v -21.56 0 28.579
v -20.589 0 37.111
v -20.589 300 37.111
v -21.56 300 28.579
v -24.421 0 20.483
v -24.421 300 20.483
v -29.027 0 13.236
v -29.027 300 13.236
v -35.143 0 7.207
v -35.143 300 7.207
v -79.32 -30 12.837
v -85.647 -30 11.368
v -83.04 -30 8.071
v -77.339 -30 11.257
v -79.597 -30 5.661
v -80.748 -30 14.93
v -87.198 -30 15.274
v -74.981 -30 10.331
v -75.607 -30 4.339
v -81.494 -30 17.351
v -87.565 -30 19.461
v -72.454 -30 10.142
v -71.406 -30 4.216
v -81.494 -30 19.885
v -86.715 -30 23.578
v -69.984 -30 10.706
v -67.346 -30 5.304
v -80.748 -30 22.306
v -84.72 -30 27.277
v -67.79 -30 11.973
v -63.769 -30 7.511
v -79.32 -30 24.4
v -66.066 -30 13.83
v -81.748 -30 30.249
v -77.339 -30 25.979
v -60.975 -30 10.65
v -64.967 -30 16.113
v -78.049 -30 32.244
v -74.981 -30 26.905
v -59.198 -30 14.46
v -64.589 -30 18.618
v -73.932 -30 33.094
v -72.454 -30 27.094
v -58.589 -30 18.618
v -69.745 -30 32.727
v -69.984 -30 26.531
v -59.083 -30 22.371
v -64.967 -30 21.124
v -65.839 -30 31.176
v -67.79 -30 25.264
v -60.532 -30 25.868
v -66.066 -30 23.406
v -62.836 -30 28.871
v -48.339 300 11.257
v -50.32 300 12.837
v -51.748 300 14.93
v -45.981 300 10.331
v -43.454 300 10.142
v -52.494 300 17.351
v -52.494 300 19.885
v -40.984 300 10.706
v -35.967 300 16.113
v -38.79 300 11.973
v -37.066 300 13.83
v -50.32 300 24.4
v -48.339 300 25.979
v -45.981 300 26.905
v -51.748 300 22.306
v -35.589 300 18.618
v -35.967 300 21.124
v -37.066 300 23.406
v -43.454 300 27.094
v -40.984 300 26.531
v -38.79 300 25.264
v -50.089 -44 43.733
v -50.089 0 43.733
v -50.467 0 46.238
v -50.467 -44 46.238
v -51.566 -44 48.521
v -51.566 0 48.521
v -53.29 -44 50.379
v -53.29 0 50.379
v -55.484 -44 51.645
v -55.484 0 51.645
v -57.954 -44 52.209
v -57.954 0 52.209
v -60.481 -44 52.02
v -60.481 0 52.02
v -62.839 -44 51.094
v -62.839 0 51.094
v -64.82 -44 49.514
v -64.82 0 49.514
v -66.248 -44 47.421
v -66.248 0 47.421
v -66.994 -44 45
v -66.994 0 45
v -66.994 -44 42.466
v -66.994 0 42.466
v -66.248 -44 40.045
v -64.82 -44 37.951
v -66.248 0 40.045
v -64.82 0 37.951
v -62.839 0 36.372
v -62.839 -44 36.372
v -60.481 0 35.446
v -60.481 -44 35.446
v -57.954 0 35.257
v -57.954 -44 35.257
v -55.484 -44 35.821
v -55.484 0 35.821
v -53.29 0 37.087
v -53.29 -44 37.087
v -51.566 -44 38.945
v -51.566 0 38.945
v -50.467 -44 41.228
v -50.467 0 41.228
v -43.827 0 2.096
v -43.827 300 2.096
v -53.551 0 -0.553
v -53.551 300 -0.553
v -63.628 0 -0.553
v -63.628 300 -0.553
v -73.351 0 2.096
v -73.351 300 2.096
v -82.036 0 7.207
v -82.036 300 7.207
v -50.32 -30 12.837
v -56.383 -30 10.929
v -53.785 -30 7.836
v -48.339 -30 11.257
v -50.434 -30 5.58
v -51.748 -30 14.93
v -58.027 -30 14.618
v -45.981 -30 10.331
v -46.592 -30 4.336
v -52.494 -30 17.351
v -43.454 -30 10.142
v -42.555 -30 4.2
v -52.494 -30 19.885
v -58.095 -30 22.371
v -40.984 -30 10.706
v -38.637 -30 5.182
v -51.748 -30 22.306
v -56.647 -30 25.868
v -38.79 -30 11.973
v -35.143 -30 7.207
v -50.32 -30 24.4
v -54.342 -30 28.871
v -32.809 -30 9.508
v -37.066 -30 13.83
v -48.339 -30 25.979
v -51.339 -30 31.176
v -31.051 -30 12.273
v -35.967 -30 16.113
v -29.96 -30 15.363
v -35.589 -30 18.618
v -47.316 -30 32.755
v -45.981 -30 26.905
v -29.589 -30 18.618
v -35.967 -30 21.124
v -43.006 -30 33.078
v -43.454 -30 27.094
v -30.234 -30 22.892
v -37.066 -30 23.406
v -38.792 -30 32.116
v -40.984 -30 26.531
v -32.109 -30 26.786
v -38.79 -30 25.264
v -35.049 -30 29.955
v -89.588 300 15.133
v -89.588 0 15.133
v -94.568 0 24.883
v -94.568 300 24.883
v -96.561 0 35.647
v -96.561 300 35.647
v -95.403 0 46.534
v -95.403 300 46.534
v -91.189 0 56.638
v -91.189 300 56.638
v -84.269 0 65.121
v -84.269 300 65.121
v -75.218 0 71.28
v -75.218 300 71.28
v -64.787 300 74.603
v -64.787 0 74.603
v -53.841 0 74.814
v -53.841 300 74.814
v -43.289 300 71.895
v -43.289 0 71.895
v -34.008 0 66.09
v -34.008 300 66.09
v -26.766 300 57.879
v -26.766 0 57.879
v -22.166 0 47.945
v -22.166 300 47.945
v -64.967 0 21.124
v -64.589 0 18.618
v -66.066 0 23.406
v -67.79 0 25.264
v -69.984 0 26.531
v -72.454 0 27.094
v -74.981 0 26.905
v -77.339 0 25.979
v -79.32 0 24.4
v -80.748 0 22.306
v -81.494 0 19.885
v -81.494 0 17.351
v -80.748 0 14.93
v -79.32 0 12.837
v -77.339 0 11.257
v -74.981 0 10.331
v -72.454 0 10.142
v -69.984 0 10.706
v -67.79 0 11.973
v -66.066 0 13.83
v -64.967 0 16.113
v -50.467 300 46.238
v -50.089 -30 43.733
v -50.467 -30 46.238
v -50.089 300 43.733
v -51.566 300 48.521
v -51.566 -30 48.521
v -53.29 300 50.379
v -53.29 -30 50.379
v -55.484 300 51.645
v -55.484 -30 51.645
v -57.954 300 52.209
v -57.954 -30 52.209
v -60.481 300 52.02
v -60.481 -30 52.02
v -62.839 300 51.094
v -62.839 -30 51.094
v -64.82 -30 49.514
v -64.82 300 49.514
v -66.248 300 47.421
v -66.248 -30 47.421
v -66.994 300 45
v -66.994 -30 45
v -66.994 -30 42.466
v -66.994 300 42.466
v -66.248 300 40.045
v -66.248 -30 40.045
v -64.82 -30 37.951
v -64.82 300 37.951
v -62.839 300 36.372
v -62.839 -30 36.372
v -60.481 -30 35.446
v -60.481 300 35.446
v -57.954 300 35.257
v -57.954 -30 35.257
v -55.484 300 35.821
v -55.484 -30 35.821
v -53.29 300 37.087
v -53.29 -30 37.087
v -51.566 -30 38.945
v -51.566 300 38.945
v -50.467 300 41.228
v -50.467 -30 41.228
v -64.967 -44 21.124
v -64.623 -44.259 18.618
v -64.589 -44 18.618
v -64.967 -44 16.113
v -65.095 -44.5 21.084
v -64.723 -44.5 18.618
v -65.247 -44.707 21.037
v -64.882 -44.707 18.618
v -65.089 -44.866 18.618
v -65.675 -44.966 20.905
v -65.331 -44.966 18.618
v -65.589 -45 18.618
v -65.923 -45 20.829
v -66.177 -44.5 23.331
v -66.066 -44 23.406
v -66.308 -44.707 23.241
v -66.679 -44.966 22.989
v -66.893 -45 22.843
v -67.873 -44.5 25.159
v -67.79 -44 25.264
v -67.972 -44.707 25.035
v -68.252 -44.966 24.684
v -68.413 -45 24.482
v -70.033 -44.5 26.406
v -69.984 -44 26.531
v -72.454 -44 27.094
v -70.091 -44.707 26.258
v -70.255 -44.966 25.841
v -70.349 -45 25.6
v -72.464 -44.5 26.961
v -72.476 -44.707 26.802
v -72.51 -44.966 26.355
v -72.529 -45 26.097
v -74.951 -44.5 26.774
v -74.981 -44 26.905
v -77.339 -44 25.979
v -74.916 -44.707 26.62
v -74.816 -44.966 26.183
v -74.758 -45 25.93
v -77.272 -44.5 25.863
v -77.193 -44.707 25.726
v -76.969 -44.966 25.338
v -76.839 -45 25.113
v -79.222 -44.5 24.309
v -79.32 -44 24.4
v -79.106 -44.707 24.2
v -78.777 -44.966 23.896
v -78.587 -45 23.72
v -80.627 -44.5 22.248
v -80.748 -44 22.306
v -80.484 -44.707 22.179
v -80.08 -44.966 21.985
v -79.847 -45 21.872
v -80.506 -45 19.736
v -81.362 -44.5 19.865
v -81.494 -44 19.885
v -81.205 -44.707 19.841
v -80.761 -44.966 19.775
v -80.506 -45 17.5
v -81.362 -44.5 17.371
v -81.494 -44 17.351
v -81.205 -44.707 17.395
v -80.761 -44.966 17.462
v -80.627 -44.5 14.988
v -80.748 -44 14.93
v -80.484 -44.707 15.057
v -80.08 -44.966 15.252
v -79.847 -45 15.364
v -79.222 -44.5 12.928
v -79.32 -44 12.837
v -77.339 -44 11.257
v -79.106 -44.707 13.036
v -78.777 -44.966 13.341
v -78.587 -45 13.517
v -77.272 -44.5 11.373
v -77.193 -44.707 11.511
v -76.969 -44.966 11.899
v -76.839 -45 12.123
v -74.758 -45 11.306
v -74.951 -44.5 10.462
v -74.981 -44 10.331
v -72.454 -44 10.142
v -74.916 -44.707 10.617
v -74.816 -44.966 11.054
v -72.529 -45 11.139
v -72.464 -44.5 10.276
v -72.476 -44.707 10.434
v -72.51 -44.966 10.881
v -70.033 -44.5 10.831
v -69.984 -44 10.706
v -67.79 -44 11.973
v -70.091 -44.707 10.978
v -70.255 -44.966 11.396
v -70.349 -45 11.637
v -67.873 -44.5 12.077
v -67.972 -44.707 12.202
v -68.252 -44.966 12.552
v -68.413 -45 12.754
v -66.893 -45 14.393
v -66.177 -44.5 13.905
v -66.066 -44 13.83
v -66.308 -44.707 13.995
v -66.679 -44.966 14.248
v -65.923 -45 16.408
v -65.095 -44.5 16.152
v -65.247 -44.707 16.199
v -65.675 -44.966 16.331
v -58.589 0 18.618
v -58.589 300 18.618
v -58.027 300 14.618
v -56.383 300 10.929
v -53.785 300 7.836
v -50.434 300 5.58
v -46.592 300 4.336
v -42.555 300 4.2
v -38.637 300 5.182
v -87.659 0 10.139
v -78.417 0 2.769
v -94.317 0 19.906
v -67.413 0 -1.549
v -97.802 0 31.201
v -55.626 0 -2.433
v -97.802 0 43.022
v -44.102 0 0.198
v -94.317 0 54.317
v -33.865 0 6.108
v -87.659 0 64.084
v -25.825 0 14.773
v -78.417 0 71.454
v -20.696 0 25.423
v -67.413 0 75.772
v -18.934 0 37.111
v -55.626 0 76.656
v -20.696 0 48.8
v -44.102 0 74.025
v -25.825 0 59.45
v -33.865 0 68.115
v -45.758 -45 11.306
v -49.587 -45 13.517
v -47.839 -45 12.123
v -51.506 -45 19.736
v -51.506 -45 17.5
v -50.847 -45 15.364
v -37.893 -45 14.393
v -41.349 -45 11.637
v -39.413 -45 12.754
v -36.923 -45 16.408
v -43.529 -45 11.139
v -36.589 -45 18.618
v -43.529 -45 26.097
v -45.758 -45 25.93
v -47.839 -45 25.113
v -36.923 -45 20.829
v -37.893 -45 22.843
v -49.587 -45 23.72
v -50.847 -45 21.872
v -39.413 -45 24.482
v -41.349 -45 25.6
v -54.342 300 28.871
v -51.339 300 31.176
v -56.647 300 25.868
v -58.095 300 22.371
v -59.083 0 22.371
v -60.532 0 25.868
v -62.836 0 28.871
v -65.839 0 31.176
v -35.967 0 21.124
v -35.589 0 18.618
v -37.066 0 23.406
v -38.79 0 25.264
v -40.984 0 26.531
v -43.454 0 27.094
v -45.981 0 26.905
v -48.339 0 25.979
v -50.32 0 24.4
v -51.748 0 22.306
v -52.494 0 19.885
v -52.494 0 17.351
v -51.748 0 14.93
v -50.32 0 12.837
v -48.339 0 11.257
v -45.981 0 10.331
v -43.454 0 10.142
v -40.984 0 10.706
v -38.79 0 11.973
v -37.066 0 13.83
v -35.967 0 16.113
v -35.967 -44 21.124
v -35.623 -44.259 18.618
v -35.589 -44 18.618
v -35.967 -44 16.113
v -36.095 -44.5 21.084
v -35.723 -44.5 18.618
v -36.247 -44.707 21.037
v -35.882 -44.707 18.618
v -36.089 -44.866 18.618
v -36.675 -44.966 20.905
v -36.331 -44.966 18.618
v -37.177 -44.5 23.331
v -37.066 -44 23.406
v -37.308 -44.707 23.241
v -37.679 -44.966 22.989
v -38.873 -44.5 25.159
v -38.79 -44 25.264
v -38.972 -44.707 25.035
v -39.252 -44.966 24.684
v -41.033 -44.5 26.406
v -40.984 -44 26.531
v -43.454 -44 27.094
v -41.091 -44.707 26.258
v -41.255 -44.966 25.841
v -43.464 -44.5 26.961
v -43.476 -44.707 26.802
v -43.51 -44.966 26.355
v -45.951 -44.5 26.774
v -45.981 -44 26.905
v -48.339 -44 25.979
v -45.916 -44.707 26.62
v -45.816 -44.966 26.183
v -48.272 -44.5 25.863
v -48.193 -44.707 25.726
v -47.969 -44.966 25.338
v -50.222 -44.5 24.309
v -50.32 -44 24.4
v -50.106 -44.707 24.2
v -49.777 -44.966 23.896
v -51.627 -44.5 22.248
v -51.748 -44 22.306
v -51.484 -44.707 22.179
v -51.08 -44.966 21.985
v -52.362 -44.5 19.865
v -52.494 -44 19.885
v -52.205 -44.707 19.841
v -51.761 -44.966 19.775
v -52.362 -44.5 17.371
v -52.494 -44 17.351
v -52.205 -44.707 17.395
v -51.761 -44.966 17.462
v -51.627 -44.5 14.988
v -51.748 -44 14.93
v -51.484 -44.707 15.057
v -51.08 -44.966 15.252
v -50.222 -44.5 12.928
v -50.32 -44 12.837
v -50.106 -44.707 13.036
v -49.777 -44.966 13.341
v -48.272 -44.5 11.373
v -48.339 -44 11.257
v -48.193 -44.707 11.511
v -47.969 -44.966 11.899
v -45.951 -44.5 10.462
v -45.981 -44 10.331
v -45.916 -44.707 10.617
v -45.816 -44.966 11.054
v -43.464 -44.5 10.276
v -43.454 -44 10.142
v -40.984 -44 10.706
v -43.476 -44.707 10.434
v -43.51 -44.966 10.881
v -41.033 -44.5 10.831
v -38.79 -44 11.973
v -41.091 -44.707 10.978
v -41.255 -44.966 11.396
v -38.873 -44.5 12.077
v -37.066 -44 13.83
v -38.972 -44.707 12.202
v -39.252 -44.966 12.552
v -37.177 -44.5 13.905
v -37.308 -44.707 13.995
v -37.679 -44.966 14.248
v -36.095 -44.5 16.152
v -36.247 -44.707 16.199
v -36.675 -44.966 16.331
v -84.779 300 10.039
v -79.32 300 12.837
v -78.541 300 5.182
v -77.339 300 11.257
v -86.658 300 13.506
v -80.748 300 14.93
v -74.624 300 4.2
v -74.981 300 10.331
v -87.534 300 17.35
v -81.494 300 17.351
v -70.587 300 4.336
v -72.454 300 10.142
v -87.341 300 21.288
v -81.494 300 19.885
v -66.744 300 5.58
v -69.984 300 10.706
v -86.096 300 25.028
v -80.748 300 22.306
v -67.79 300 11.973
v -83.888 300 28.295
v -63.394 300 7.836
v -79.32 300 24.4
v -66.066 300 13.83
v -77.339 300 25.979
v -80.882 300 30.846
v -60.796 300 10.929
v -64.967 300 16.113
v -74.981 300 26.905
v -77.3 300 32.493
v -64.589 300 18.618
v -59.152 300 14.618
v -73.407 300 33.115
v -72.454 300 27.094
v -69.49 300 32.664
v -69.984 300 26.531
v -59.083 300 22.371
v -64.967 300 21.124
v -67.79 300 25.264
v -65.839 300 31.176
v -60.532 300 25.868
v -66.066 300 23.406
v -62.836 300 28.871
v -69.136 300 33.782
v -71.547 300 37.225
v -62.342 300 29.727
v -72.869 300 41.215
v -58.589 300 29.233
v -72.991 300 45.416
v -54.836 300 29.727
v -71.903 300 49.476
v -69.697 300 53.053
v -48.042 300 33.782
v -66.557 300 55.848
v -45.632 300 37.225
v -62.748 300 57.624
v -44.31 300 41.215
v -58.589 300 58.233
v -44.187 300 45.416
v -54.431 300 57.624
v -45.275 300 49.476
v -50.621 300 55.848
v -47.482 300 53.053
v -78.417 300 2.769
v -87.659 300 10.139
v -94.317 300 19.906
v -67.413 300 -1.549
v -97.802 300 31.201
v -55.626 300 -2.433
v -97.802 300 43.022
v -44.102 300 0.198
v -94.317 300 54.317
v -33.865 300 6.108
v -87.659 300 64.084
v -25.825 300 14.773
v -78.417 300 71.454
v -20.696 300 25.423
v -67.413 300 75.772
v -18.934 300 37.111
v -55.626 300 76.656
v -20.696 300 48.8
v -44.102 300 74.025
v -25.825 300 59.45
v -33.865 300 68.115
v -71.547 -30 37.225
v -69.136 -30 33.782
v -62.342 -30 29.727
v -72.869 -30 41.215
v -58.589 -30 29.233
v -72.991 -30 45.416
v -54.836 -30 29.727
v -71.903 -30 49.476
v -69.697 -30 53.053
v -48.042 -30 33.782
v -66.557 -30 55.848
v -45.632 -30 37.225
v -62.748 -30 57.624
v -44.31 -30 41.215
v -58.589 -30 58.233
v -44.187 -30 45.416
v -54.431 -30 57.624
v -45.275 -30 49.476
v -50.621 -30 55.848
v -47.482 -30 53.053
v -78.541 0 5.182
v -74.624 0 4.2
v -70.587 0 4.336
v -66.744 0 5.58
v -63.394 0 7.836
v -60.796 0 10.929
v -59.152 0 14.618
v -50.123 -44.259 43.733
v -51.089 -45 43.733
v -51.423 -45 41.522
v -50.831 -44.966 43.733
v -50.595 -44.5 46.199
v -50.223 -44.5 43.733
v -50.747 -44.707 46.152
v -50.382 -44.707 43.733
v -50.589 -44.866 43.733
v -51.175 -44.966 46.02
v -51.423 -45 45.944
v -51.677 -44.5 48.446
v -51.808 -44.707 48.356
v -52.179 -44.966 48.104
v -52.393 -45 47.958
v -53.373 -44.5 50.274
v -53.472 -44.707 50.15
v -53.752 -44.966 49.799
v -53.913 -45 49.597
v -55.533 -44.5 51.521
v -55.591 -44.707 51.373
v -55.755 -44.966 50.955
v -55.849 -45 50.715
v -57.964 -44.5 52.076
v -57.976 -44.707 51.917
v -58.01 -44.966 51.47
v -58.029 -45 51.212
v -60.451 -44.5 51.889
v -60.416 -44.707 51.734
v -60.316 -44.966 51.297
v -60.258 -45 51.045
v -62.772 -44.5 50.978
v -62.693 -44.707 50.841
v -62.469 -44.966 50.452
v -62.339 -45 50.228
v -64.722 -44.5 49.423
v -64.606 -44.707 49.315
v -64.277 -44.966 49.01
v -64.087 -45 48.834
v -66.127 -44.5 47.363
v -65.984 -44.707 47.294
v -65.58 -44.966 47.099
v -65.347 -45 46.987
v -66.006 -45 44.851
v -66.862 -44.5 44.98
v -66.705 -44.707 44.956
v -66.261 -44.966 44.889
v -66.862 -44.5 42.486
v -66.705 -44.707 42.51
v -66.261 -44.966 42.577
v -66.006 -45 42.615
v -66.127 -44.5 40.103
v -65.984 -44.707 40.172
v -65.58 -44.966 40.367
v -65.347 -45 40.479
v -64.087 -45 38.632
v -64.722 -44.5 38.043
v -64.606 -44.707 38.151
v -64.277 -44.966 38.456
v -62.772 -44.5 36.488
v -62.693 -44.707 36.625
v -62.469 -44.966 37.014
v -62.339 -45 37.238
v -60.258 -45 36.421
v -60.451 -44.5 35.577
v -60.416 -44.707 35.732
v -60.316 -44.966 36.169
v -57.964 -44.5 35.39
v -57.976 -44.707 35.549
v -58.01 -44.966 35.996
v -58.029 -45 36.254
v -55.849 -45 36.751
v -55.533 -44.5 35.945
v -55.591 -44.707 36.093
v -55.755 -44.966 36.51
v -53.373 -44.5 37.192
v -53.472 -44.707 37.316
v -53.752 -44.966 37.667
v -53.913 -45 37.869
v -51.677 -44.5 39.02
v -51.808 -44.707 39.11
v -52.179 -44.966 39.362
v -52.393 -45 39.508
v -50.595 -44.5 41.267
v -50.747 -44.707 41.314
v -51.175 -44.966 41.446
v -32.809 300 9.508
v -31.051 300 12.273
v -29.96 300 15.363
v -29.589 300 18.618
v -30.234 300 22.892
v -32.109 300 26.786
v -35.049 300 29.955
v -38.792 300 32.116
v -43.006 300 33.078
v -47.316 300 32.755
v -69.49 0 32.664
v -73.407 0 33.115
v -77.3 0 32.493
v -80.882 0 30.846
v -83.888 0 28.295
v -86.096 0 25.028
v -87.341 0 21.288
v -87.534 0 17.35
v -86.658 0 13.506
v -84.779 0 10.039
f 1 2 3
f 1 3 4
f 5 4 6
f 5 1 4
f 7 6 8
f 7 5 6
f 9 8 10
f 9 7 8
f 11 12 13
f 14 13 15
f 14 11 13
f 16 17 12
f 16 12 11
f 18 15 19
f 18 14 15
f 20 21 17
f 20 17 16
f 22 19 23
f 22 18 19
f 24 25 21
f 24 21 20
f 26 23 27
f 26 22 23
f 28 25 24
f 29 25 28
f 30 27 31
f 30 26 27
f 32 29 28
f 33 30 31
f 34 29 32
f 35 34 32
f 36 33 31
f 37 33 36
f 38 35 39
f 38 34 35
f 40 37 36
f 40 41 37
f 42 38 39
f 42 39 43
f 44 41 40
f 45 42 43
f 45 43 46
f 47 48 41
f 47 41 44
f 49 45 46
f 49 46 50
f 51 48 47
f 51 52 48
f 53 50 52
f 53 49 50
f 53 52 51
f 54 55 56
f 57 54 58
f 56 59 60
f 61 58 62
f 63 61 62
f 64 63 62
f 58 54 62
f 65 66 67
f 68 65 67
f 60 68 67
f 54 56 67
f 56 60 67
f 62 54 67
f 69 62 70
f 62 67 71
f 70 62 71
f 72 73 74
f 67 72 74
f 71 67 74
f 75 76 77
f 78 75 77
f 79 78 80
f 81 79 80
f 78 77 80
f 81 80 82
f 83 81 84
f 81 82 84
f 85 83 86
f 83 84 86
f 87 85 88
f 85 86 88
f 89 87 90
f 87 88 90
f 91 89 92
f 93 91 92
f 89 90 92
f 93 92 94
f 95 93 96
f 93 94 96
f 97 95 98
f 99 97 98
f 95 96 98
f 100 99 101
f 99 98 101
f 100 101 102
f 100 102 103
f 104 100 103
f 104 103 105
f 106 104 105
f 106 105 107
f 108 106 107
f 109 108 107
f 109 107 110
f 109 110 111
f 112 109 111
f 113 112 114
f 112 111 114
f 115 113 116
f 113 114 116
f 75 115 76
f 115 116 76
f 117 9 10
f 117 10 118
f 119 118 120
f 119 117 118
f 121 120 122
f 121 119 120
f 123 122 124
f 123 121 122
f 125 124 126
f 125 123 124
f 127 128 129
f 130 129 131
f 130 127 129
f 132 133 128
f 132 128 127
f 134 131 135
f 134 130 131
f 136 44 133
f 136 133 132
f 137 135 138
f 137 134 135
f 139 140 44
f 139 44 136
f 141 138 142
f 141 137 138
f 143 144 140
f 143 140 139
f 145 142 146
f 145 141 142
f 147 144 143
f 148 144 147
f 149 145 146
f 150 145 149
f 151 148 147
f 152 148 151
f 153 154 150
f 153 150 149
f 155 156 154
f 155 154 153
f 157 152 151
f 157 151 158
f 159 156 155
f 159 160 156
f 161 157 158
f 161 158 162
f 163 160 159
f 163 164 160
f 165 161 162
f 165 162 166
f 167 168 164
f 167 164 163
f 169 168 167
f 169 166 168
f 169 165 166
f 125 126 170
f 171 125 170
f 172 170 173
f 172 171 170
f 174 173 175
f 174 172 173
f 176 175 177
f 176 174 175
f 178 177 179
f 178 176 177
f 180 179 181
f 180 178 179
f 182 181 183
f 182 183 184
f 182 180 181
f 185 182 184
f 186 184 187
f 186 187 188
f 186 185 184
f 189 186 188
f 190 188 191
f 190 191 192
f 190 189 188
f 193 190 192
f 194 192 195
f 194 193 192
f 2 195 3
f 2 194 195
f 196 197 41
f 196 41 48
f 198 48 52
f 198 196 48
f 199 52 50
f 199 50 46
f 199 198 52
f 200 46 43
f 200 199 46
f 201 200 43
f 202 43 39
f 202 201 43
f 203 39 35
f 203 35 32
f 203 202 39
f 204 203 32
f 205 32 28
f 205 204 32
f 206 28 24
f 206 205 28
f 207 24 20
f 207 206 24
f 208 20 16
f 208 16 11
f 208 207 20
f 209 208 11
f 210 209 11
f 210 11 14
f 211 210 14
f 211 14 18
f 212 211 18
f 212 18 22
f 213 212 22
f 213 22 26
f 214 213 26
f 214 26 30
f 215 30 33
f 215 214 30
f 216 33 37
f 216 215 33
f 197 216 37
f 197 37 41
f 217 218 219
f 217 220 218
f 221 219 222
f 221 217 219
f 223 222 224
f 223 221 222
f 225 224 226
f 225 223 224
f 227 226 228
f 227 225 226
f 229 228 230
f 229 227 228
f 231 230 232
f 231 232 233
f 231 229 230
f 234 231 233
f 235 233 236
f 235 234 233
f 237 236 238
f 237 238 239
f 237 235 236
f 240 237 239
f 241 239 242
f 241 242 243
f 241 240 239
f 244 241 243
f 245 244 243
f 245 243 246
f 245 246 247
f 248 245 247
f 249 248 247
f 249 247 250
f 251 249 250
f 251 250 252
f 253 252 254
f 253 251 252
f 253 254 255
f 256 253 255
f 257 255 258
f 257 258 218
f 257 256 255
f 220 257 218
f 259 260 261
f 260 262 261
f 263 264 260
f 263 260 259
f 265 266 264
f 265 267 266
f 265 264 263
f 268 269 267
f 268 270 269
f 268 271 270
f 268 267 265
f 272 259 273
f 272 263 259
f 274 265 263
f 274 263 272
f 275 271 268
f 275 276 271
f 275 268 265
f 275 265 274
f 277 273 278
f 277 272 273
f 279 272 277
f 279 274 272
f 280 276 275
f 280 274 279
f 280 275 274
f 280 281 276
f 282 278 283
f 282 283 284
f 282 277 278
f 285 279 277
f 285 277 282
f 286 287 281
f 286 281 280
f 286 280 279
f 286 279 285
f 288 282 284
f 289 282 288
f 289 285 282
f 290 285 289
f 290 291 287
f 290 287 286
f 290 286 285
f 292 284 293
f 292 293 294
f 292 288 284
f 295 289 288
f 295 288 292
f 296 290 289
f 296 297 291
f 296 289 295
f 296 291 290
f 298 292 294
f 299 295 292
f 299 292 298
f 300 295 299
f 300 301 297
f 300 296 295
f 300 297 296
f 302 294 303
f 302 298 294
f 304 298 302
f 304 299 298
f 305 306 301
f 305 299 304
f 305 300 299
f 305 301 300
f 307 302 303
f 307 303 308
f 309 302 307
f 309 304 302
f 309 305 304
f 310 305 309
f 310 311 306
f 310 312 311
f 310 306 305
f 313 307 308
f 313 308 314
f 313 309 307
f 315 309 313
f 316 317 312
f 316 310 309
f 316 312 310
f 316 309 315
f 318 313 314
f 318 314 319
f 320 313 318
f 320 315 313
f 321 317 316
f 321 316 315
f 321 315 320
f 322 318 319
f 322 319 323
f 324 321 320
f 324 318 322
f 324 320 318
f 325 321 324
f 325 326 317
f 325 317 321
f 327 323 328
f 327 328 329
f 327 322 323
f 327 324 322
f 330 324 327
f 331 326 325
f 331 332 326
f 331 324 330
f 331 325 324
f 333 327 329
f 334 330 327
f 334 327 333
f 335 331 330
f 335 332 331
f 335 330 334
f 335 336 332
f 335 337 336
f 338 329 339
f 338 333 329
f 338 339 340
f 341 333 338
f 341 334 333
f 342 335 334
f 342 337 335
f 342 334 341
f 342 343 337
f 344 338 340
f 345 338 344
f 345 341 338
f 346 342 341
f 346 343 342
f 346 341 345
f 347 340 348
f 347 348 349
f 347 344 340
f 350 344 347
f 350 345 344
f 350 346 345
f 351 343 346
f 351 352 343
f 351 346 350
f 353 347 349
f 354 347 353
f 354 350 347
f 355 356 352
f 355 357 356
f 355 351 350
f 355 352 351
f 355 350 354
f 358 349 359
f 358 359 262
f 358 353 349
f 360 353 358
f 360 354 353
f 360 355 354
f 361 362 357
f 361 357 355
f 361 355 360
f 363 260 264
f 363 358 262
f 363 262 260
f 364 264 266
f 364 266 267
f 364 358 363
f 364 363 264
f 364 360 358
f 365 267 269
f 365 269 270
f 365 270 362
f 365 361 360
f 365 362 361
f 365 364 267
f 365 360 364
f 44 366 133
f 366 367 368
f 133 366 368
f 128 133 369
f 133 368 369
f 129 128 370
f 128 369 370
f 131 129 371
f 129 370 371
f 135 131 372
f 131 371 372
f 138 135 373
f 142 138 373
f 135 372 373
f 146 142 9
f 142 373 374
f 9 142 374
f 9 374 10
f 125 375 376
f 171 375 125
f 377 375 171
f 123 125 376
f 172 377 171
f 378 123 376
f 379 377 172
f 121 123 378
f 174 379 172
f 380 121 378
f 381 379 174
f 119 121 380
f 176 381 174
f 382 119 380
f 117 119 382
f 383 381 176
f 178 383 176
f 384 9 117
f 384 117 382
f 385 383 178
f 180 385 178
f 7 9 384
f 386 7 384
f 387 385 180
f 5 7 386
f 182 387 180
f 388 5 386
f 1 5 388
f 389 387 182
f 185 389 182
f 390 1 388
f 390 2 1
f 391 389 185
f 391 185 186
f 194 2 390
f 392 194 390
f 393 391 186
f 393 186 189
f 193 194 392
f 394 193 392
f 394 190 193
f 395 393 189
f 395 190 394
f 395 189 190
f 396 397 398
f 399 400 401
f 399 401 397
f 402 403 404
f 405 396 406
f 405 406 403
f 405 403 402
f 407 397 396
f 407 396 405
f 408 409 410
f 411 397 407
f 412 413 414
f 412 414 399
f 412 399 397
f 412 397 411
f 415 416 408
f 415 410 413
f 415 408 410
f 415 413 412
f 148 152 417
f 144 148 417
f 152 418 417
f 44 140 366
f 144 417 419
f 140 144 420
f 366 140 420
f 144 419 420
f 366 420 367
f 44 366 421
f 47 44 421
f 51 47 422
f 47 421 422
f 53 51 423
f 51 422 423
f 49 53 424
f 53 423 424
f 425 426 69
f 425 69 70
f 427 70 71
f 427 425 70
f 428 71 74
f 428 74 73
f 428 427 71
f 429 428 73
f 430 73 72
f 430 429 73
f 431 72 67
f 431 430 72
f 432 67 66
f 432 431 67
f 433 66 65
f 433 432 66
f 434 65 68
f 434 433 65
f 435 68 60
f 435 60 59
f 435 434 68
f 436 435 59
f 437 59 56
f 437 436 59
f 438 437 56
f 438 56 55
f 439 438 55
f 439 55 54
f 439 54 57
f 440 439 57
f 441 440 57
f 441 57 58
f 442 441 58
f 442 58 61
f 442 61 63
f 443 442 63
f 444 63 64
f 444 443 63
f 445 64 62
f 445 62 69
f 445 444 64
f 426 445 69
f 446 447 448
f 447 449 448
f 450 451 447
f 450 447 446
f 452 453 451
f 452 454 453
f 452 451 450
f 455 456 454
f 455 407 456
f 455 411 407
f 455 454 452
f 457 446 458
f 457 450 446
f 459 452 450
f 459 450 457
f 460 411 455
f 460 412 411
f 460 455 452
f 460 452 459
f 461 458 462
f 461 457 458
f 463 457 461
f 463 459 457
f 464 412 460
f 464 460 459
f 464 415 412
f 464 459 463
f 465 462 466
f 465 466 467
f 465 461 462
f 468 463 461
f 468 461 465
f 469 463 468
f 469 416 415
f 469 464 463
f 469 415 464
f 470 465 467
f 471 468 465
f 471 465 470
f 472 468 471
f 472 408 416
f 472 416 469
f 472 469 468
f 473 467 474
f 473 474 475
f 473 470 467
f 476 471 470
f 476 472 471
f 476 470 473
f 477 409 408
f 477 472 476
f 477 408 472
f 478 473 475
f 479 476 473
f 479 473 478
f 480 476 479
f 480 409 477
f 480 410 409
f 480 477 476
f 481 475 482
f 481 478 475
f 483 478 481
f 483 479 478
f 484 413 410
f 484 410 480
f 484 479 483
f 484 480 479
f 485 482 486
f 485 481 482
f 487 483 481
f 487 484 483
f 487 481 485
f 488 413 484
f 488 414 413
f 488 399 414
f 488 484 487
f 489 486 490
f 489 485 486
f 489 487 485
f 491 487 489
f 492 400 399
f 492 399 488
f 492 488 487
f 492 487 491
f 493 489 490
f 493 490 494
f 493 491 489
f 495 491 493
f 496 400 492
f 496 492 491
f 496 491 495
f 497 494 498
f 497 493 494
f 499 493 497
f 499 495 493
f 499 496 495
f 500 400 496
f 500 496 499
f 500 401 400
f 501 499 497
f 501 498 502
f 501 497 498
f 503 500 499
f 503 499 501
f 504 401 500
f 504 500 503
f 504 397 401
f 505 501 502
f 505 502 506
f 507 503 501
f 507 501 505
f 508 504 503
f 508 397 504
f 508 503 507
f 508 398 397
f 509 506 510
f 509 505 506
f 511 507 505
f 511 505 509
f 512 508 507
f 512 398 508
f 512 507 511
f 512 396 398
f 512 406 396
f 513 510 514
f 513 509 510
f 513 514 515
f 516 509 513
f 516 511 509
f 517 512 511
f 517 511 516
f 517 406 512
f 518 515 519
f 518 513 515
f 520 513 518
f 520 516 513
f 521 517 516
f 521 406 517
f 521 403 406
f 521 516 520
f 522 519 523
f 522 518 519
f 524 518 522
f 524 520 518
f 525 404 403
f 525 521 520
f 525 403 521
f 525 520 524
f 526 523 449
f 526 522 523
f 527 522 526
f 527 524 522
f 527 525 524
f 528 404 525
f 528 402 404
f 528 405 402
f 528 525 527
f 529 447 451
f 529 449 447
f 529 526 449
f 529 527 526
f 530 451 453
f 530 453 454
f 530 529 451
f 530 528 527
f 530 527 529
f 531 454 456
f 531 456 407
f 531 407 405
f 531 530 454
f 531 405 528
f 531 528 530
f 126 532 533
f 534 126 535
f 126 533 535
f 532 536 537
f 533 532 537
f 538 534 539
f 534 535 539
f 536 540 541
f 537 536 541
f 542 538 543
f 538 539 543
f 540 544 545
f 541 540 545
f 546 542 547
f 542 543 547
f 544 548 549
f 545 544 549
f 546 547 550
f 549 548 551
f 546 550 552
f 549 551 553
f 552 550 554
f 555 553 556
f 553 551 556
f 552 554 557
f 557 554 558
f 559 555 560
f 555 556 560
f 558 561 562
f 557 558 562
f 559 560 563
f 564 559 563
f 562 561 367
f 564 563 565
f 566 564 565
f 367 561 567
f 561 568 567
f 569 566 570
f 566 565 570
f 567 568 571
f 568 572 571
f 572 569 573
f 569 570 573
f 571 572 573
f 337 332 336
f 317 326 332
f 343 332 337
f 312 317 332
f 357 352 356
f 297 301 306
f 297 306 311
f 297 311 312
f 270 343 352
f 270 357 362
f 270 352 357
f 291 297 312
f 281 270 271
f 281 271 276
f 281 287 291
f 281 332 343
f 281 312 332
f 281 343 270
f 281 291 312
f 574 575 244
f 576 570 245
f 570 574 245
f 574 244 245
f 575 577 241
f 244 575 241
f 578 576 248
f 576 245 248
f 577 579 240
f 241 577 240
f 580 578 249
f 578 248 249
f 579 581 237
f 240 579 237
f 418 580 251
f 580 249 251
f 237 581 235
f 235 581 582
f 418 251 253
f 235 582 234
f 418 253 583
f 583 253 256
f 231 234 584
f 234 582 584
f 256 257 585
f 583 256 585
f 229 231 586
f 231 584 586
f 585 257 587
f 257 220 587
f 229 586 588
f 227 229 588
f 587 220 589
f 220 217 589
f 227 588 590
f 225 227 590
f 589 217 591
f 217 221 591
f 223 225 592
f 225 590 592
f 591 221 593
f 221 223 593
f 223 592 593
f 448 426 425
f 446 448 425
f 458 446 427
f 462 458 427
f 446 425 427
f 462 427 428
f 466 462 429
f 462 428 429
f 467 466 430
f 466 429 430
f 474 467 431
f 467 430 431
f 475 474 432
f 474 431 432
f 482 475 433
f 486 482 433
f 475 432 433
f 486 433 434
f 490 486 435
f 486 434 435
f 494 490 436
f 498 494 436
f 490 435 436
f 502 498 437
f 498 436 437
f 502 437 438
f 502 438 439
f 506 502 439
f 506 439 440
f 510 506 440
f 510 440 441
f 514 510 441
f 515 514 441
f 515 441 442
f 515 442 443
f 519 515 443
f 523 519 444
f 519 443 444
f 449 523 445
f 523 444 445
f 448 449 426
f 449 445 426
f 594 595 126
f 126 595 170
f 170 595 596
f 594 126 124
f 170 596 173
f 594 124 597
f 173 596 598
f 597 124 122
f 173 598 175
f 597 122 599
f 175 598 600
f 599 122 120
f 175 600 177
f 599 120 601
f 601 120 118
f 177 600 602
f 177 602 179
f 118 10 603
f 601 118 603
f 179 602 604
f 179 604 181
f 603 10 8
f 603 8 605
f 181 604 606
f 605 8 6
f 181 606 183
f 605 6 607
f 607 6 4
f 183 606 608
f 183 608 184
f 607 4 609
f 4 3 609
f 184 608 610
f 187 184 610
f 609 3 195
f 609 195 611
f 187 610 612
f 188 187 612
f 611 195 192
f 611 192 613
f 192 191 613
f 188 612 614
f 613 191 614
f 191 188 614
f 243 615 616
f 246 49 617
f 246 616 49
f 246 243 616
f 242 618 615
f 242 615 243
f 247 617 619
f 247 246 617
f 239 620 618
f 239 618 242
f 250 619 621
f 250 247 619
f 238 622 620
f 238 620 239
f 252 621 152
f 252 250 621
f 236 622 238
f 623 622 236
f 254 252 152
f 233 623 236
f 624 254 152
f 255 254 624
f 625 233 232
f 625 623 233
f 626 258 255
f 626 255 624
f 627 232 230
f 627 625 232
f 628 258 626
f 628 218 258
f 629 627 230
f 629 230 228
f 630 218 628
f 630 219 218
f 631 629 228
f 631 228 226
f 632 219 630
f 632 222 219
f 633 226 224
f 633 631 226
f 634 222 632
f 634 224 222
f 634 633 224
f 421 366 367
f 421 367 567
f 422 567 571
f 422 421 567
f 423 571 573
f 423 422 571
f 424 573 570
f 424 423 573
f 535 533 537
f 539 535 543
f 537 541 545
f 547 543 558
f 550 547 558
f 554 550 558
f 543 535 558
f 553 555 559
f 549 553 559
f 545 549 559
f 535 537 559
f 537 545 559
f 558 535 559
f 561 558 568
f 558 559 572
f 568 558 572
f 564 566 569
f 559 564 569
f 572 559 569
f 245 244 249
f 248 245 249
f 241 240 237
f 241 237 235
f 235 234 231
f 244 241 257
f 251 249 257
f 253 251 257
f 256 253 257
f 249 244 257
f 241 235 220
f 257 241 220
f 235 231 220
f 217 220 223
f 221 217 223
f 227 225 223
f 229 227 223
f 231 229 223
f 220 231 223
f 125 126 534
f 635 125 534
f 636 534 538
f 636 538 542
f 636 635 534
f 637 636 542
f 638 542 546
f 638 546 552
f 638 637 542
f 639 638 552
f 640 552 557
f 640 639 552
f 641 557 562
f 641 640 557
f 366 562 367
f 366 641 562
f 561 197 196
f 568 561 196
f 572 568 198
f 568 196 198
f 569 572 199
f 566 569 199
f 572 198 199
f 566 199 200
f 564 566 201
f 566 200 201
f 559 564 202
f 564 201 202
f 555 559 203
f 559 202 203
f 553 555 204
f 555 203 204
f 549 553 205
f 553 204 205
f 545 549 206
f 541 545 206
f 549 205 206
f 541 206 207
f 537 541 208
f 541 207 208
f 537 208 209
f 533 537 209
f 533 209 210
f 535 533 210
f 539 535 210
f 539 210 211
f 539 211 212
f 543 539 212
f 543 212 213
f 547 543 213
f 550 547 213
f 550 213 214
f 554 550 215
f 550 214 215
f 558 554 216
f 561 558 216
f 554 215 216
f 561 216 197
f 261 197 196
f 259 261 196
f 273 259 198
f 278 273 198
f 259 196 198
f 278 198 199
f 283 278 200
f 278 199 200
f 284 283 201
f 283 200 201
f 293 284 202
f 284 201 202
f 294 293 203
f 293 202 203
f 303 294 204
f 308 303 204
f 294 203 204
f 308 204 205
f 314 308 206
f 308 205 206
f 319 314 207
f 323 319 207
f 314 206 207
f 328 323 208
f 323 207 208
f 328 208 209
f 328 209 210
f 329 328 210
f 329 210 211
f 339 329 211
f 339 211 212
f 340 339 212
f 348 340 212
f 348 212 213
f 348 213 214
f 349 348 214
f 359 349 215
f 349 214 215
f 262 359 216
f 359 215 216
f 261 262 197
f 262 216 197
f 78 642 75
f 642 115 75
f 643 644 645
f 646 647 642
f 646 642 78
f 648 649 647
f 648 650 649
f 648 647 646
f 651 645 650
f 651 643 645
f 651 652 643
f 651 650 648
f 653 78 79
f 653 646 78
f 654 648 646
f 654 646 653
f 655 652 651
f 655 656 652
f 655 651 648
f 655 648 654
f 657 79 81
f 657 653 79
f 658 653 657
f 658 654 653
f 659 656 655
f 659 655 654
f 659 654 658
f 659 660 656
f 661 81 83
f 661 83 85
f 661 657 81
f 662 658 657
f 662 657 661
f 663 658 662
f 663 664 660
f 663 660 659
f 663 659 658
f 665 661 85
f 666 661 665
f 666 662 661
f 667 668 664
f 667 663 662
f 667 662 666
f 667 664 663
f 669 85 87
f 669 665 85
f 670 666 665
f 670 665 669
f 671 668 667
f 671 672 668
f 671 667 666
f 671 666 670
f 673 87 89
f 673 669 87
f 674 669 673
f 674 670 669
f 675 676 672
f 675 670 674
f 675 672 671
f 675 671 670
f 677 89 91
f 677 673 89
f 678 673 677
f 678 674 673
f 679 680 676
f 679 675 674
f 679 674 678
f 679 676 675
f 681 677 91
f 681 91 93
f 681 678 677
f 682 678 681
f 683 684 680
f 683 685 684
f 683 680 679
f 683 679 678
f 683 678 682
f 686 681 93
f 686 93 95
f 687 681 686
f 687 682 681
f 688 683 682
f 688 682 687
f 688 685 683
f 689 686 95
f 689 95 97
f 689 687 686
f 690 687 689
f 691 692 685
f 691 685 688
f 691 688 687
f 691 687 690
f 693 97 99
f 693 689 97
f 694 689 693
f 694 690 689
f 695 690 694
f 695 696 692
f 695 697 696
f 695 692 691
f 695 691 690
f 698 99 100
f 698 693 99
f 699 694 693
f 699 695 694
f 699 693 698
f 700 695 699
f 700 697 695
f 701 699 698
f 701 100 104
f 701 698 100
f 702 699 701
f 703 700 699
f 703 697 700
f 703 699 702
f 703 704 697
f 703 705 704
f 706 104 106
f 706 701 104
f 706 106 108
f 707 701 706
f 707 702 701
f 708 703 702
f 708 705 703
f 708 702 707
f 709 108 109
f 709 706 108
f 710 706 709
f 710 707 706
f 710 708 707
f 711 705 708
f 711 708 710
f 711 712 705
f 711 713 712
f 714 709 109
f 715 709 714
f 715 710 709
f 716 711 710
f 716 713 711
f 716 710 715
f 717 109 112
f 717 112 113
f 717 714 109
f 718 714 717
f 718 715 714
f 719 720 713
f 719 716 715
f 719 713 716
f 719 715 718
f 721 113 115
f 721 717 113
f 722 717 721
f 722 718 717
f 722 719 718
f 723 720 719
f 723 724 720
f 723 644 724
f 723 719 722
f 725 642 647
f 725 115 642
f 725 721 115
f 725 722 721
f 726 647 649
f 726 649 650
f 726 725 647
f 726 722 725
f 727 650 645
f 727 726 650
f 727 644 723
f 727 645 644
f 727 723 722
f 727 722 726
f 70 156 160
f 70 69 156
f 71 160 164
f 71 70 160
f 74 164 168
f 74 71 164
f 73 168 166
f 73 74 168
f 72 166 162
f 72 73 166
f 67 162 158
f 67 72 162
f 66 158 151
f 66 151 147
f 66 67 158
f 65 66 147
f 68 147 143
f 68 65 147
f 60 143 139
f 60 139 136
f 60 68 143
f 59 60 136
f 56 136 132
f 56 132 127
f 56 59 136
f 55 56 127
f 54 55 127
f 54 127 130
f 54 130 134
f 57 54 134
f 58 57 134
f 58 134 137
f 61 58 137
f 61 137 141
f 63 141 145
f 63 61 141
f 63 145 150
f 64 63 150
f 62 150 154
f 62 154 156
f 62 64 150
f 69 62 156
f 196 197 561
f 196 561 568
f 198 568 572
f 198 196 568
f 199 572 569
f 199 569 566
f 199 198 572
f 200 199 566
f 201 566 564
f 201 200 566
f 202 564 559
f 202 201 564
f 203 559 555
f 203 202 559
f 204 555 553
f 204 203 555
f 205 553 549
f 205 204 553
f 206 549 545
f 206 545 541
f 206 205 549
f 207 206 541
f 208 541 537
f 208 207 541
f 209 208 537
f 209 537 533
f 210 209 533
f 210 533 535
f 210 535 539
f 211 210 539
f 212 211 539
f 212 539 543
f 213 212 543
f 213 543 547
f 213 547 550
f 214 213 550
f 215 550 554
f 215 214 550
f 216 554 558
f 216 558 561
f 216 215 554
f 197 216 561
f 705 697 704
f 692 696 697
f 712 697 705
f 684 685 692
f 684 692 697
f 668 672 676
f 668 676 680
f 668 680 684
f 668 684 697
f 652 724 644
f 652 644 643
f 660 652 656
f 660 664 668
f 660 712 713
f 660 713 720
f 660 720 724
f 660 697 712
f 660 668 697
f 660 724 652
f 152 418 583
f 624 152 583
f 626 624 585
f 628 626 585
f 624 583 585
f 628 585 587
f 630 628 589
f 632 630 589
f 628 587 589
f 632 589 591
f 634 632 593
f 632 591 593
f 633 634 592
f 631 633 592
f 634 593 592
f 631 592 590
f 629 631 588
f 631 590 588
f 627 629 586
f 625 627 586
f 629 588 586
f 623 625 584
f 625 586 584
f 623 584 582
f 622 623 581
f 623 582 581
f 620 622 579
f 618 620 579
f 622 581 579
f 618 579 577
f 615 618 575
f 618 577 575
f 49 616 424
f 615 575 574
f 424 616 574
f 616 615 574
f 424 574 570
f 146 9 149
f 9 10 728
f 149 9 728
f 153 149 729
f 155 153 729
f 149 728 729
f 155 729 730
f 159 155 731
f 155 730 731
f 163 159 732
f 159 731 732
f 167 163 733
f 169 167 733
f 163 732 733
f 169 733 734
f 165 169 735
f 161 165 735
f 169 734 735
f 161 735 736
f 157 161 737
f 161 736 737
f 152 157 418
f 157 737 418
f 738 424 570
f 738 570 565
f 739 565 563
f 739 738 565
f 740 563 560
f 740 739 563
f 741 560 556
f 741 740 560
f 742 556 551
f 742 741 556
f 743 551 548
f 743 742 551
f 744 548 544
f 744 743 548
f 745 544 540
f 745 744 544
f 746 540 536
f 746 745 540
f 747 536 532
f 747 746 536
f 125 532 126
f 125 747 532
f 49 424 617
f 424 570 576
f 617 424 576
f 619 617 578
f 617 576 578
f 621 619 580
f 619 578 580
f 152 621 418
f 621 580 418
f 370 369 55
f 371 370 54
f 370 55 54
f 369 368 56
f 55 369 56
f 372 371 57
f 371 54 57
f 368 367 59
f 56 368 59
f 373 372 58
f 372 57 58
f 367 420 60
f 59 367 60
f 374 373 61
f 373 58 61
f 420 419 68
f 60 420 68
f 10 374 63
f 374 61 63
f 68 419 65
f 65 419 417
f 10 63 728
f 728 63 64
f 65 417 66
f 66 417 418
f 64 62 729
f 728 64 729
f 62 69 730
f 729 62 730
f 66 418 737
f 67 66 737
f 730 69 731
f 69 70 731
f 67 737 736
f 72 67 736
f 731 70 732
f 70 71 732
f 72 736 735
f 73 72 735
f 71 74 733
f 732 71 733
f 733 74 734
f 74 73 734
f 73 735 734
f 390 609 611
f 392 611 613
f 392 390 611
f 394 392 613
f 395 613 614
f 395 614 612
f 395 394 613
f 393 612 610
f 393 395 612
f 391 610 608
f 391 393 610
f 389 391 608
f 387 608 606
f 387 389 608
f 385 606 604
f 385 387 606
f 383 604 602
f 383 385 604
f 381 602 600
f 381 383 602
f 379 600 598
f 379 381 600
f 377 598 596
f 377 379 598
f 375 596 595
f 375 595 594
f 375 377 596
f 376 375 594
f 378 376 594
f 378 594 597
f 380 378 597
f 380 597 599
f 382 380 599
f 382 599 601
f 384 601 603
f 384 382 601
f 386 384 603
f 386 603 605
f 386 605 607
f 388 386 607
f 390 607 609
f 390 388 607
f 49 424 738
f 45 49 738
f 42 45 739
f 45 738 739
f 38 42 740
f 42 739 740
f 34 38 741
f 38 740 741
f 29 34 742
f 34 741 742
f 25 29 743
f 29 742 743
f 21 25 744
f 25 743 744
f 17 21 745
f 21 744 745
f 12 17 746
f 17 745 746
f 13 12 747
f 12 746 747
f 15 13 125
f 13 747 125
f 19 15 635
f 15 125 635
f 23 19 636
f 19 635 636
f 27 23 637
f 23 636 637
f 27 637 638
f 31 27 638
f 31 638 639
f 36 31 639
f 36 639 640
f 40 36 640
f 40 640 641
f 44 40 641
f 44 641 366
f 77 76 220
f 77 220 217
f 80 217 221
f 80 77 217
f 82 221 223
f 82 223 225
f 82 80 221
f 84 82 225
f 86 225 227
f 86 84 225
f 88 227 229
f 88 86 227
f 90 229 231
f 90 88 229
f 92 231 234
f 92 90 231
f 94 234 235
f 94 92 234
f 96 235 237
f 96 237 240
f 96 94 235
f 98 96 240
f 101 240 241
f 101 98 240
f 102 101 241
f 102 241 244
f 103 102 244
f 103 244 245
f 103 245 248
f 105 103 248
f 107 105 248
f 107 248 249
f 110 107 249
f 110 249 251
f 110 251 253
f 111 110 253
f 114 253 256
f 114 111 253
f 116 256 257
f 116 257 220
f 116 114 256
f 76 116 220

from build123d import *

# Parameters (mm, degrees)
F0_R          = 39.6551273515
F1_DEPTH      = 300
F0_R_2        = 8.5
F2_DEPTH      = 300
F2_DEPTH_BACK = 30
F3_DEPTH      = 300
F3_DEPTH_BACK = 45
F4_R          = 1
F4_2_R        = 1
F4_3_R        = 1


with BuildPart() as f1:
    # F0 (on Front) → F1 (new body)
    with BuildSketch(Plane.XZ):
        with Locations((-58.5893206298, 37.1114652178)):
            Circle(F0_R)
        with BuildLine():
            ThreePointArc((-82.0361289194, 7.2074992429), (-75.2179297869, 71.2800086094), (-20.5893206298, 37.1114652178))
            ThreePointArc((-20.5893206298, 37.1114652178), (-24.4207772637, 20.4828560086), (-35.1425124316, 7.2074991713))
            ThreePointArc((-35.1425124316, 7.2074991713), (-58.5893206879, -0.8885347822), (-82.0361289194, 7.2074992429))
        make_face(mode=Mode.SUBTRACT)
    extrude(amount=-F1_DEPTH)



with BuildPart() as f2:
    # F0 (on Front) → F2 (new body, two sides)
    with BuildSketch(Plane.XZ) as f2_sk:
        with BuildLine():
            ThreePointArc((-44.0893206298, 43.7329599187), (-65.8393203648, 56.2903284266), (-65.83932116, 31.1755918699))
            ThreePointArc((-65.83932116, 31.1755918699), (-58.5893212438, 29.2329599187), (-51.3393211631, 31.1755912559))
            ThreePointArc((-51.3393211631, 31.1755912559), (-46.0319524289, 36.482959652), (-44.0893206298, 43.7329599187))
        make_face()
        with Locations((-58.5893206298, 43.7329599187)):
            Circle(F0_R_2, mode=Mode.SUBTRACT)
    extrude(amount=-F2_DEPTH)
    extrude(f2_sk.sketch, amount=F2_DEPTH_BACK)


with BuildPart() as f1_1:
    add(f1.part)

    add(f2.part)  # F2#2 merges F2
    # F0 (on Front) → F2, piece 2 (join, two sides)
    with BuildSketch(Plane.XZ) as f2_2_sk:
        with BuildLine():
            ThreePointArc((-65.83932116, 31.1755918699), (-85.1033605868, 26.7368957552), (-82.0361289194, 7.2074992429))
            ThreePointArc((-82.0361289194, 7.2074992429), (-66.7441933734, 5.5802264265), (-58.5893206298, 18.6182232089))
            ThreePointArc((-58.5893206298, 18.6182232089), (-60.531952428, 25.868223474), (-65.83932116, 31.1755918699))
        make_face()
        with Locations((-73.0893206298, 18.6182232089)):
            Circle(F0_R_2, mode=Mode.SUBTRACT)
        with BuildLine():
            ThreePointArc((-58.5893206298, 18.6182232089), (-50.4344479385, 5.5802264519), (-35.1425124316, 7.2074991713))
            ThreePointArc((-35.1425124316, 7.2074991713), (-31.0513238728, 12.2730959003), (-29.5893206298, 18.6182232089))
            ThreePointArc((-29.5893206298, 18.6182232089), (-36.8393208965, 31.1755917178), (-51.3393211631, 31.1755912559))
            ThreePointArc((-51.3393211631, 31.1755912559), (-56.6466891387, 25.8682229423), (-58.5893206298, 18.6182232089))
        make_face()
        with Locations((-44.0893206298, 18.6182232089)):
            Circle(F0_R_2, mode=Mode.SUBTRACT)
    extrude(amount=-F2_DEPTH)
    extrude(f2_2_sk.sketch, amount=F2_DEPTH_BACK)


with BuildPart() as f3:
    # F0 (on Front) → F3 (new body, two sides)
    with BuildSketch(Plane.XZ) as f3_sk:
        with Locations((-58.5893206298, 43.7329599187)):
            Circle(F0_R_2)
    extrude(amount=-F3_DEPTH)
    extrude(f3_sk.sketch, amount=F3_DEPTH_BACK)

    # F4
    f4_edges = [f3.edges().sort_by_distance(p)[0] for p in [
        (-67.089321, -45, 43.73296),
    ]]
    fillet(f4_edges, radius=F4_R)


with BuildPart() as f3b:
    # F0 (on Front) → F3, piece 2 (new body, two sides)
    with BuildSketch(Plane.XZ) as f3_2_sk:
        with Locations((-73.0893206298, 18.6182232089)):
            Circle(F0_R_2)
    extrude(amount=-F3_DEPTH)
    extrude(f3_2_sk.sketch, amount=F3_DEPTH_BACK)

    # F4#2
    f4_2_edges = [f3b.edges().sort_by_distance(p)[0] for p in [
        (-81.589321, -45, 18.618223),
    ]]
    fillet(f4_2_edges, radius=F4_2_R)


with BuildPart() as f3c:
    # F0 (on Front) → F3, piece 3 (new body, two sides)
    with BuildSketch(Plane.XZ) as f3_3_sk:
        with Locations((-44.0893206298, 18.6182232089)):
            Circle(F0_R_2)
    extrude(amount=-F3_DEPTH)
    extrude(f3_3_sk.sketch, amount=F3_DEPTH_BACK)

    # F4#3
    f4_3_edges = [f3c.edges().sort_by_distance(p)[0] for p in [
        (-52.589321, -45, 18.618223),
    ]]
    fillet(f4_3_edges, radius=F4_3_R)


solid = Compound([f1_1.part, f3.part, f3b.part, f3c.part])
